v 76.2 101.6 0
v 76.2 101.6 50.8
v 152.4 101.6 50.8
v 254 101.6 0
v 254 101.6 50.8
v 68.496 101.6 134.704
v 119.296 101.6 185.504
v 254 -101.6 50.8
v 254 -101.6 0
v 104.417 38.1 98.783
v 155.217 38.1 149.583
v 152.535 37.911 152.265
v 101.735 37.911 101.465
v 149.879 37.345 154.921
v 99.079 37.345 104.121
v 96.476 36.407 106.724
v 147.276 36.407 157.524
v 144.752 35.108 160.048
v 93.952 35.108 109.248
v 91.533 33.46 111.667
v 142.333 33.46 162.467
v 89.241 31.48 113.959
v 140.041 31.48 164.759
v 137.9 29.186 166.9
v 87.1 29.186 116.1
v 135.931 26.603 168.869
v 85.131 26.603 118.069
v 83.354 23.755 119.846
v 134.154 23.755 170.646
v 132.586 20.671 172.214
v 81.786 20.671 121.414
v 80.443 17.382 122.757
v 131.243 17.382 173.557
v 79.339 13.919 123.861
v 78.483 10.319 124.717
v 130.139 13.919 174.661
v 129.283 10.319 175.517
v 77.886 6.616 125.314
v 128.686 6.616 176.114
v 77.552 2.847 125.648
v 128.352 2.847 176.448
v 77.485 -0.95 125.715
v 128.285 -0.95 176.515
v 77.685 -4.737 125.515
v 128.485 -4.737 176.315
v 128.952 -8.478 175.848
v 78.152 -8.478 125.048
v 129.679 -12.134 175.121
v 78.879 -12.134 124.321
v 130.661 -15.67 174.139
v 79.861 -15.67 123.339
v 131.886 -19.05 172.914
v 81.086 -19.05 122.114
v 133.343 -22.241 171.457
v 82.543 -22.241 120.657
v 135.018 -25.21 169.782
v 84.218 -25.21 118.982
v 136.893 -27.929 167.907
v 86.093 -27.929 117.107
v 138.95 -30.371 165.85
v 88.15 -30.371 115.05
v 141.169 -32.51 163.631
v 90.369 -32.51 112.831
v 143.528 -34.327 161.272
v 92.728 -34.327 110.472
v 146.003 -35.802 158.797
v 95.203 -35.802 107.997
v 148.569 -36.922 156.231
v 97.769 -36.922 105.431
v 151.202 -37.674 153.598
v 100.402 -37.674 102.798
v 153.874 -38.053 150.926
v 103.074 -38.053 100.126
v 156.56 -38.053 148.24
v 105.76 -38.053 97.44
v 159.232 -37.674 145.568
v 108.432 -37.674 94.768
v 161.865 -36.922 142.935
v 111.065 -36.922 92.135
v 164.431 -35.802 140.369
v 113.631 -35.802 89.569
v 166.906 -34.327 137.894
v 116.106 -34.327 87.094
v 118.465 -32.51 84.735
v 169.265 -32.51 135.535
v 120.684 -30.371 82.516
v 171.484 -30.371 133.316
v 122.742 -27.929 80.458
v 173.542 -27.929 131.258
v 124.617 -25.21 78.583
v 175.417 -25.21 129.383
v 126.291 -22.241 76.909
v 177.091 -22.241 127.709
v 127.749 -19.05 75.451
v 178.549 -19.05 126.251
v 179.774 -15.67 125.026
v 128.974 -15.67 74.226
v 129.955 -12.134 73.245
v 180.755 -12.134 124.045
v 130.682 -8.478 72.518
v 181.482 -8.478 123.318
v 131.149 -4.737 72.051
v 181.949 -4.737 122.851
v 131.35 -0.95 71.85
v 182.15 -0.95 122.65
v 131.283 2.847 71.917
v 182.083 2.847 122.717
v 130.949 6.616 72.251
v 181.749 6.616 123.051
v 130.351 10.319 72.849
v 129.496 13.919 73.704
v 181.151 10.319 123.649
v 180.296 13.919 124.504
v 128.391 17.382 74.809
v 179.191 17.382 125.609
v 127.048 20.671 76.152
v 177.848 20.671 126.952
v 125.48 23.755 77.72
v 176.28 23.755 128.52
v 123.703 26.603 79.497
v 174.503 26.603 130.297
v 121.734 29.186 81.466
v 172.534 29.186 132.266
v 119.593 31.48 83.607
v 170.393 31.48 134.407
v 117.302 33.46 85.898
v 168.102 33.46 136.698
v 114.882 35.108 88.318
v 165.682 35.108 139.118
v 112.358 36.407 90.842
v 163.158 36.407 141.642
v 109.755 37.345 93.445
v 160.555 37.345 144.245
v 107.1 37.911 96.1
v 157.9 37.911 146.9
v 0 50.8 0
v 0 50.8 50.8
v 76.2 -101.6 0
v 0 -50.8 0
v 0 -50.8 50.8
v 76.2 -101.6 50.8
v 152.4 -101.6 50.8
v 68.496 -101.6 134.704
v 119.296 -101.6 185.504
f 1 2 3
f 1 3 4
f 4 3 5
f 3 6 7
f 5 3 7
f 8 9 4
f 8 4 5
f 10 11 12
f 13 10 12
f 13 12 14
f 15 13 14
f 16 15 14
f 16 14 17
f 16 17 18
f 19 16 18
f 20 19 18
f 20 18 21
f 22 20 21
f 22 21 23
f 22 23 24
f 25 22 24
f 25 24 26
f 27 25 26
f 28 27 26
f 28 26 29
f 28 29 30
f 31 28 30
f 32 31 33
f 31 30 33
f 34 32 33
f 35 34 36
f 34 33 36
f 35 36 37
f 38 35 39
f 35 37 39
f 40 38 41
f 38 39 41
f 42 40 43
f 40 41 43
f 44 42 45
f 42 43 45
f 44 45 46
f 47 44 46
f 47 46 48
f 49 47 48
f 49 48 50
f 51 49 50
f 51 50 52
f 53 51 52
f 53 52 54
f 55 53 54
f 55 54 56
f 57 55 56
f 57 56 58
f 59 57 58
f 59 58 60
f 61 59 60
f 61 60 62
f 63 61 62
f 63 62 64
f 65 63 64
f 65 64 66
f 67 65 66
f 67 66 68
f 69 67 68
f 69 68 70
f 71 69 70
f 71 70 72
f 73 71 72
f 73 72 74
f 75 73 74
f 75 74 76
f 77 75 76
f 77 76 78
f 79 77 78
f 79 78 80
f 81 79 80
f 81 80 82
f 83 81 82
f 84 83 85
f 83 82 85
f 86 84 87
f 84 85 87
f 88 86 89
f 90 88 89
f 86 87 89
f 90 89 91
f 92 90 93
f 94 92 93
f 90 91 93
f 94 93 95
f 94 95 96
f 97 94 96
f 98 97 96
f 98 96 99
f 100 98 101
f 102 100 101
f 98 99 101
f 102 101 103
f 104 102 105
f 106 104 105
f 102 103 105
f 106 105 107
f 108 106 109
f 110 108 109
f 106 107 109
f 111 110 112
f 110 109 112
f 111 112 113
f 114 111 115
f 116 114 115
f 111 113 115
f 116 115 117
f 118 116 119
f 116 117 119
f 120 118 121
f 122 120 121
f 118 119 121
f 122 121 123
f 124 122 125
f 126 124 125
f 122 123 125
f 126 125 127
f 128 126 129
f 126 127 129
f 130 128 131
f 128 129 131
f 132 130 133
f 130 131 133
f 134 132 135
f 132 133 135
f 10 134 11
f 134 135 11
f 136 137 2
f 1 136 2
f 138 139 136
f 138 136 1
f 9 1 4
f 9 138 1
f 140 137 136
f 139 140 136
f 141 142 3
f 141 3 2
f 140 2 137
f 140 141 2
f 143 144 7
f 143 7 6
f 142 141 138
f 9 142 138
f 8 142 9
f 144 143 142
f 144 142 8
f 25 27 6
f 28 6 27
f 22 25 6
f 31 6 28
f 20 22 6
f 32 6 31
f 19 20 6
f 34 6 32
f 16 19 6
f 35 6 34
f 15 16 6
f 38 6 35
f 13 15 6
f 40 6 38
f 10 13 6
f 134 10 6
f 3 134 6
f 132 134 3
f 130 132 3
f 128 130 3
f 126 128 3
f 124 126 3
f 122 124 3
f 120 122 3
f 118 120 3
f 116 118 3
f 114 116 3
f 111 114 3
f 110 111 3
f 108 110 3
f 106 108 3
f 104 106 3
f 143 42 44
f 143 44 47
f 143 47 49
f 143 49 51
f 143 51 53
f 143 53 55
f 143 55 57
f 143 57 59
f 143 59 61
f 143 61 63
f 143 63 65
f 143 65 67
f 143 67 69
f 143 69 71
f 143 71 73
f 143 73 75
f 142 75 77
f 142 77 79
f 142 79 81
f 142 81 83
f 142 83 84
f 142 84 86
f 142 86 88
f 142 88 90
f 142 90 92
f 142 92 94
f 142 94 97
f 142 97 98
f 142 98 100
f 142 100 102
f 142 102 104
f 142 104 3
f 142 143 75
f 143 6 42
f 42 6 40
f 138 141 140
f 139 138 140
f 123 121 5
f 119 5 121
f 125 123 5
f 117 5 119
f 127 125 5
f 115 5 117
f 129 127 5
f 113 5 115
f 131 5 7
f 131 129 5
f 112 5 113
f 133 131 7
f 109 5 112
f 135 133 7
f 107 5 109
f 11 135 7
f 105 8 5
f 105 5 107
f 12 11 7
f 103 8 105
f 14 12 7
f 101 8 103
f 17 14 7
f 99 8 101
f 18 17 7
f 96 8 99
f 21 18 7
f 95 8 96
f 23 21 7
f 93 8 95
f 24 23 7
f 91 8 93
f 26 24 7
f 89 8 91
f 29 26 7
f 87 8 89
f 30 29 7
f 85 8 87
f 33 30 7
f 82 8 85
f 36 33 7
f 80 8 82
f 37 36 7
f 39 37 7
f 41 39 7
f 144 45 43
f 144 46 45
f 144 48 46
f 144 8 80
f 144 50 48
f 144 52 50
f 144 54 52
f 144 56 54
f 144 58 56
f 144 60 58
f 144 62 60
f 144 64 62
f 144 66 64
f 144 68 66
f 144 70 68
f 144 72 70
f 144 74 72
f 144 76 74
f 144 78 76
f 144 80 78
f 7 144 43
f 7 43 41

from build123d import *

# Parameters (mm, degrees)
F1_DEPTH      = 101.6
F3_DEPTH      = 50.801
F5_R          = 38.1
F6_DEPTH      = 101.6
F6_DEPTH_BACK = 101.6


with BuildPart() as f1:
    # F0 (on Front) → F1 (new body, symmetric)
    with BuildSketch(Plane.XZ):
        Polygon((0, 50.8), (0, 0), (254, 0), (254, 50.8), (119.296158184, 185.503841816), (68.496158184, 134.703841816), (152.4, 50.8), align=None)
    extrude(amount=F1_DEPTH, both=True)

    # F2 (on face) → F3 (cut, through all)
    with BuildSketch(Plane.XY.offset(50.8)):
        Polygon((76.2, 101.6), (0, 101.6), (0, 50.8), align=None)
        Polygon((76.2, -101.6), (0, -50.8), (0, -101.6), align=None)
    extrude(amount=-F3_DEPTH, mode=Mode.SUBTRACT)

    # F5 (on offset) → F6 (cut, two sides)
    with BuildSketch(Plane(origin=(170.3605122421, 0, 170.3605122421), x_dir=(0, 1, 0), z_dir=(0.7071067812, 0, 0.7071067812))) as f6_sk:
        with Locations((0, -3.9840979371)):
            Circle(F5_R)
    extrude(amount=F6_DEPTH, mode=Mode.SUBTRACT)
    extrude(f6_sk.sketch, amount=-F6_DEPTH_BACK, mode=Mode.SUBTRACT)


solid = f1.part
